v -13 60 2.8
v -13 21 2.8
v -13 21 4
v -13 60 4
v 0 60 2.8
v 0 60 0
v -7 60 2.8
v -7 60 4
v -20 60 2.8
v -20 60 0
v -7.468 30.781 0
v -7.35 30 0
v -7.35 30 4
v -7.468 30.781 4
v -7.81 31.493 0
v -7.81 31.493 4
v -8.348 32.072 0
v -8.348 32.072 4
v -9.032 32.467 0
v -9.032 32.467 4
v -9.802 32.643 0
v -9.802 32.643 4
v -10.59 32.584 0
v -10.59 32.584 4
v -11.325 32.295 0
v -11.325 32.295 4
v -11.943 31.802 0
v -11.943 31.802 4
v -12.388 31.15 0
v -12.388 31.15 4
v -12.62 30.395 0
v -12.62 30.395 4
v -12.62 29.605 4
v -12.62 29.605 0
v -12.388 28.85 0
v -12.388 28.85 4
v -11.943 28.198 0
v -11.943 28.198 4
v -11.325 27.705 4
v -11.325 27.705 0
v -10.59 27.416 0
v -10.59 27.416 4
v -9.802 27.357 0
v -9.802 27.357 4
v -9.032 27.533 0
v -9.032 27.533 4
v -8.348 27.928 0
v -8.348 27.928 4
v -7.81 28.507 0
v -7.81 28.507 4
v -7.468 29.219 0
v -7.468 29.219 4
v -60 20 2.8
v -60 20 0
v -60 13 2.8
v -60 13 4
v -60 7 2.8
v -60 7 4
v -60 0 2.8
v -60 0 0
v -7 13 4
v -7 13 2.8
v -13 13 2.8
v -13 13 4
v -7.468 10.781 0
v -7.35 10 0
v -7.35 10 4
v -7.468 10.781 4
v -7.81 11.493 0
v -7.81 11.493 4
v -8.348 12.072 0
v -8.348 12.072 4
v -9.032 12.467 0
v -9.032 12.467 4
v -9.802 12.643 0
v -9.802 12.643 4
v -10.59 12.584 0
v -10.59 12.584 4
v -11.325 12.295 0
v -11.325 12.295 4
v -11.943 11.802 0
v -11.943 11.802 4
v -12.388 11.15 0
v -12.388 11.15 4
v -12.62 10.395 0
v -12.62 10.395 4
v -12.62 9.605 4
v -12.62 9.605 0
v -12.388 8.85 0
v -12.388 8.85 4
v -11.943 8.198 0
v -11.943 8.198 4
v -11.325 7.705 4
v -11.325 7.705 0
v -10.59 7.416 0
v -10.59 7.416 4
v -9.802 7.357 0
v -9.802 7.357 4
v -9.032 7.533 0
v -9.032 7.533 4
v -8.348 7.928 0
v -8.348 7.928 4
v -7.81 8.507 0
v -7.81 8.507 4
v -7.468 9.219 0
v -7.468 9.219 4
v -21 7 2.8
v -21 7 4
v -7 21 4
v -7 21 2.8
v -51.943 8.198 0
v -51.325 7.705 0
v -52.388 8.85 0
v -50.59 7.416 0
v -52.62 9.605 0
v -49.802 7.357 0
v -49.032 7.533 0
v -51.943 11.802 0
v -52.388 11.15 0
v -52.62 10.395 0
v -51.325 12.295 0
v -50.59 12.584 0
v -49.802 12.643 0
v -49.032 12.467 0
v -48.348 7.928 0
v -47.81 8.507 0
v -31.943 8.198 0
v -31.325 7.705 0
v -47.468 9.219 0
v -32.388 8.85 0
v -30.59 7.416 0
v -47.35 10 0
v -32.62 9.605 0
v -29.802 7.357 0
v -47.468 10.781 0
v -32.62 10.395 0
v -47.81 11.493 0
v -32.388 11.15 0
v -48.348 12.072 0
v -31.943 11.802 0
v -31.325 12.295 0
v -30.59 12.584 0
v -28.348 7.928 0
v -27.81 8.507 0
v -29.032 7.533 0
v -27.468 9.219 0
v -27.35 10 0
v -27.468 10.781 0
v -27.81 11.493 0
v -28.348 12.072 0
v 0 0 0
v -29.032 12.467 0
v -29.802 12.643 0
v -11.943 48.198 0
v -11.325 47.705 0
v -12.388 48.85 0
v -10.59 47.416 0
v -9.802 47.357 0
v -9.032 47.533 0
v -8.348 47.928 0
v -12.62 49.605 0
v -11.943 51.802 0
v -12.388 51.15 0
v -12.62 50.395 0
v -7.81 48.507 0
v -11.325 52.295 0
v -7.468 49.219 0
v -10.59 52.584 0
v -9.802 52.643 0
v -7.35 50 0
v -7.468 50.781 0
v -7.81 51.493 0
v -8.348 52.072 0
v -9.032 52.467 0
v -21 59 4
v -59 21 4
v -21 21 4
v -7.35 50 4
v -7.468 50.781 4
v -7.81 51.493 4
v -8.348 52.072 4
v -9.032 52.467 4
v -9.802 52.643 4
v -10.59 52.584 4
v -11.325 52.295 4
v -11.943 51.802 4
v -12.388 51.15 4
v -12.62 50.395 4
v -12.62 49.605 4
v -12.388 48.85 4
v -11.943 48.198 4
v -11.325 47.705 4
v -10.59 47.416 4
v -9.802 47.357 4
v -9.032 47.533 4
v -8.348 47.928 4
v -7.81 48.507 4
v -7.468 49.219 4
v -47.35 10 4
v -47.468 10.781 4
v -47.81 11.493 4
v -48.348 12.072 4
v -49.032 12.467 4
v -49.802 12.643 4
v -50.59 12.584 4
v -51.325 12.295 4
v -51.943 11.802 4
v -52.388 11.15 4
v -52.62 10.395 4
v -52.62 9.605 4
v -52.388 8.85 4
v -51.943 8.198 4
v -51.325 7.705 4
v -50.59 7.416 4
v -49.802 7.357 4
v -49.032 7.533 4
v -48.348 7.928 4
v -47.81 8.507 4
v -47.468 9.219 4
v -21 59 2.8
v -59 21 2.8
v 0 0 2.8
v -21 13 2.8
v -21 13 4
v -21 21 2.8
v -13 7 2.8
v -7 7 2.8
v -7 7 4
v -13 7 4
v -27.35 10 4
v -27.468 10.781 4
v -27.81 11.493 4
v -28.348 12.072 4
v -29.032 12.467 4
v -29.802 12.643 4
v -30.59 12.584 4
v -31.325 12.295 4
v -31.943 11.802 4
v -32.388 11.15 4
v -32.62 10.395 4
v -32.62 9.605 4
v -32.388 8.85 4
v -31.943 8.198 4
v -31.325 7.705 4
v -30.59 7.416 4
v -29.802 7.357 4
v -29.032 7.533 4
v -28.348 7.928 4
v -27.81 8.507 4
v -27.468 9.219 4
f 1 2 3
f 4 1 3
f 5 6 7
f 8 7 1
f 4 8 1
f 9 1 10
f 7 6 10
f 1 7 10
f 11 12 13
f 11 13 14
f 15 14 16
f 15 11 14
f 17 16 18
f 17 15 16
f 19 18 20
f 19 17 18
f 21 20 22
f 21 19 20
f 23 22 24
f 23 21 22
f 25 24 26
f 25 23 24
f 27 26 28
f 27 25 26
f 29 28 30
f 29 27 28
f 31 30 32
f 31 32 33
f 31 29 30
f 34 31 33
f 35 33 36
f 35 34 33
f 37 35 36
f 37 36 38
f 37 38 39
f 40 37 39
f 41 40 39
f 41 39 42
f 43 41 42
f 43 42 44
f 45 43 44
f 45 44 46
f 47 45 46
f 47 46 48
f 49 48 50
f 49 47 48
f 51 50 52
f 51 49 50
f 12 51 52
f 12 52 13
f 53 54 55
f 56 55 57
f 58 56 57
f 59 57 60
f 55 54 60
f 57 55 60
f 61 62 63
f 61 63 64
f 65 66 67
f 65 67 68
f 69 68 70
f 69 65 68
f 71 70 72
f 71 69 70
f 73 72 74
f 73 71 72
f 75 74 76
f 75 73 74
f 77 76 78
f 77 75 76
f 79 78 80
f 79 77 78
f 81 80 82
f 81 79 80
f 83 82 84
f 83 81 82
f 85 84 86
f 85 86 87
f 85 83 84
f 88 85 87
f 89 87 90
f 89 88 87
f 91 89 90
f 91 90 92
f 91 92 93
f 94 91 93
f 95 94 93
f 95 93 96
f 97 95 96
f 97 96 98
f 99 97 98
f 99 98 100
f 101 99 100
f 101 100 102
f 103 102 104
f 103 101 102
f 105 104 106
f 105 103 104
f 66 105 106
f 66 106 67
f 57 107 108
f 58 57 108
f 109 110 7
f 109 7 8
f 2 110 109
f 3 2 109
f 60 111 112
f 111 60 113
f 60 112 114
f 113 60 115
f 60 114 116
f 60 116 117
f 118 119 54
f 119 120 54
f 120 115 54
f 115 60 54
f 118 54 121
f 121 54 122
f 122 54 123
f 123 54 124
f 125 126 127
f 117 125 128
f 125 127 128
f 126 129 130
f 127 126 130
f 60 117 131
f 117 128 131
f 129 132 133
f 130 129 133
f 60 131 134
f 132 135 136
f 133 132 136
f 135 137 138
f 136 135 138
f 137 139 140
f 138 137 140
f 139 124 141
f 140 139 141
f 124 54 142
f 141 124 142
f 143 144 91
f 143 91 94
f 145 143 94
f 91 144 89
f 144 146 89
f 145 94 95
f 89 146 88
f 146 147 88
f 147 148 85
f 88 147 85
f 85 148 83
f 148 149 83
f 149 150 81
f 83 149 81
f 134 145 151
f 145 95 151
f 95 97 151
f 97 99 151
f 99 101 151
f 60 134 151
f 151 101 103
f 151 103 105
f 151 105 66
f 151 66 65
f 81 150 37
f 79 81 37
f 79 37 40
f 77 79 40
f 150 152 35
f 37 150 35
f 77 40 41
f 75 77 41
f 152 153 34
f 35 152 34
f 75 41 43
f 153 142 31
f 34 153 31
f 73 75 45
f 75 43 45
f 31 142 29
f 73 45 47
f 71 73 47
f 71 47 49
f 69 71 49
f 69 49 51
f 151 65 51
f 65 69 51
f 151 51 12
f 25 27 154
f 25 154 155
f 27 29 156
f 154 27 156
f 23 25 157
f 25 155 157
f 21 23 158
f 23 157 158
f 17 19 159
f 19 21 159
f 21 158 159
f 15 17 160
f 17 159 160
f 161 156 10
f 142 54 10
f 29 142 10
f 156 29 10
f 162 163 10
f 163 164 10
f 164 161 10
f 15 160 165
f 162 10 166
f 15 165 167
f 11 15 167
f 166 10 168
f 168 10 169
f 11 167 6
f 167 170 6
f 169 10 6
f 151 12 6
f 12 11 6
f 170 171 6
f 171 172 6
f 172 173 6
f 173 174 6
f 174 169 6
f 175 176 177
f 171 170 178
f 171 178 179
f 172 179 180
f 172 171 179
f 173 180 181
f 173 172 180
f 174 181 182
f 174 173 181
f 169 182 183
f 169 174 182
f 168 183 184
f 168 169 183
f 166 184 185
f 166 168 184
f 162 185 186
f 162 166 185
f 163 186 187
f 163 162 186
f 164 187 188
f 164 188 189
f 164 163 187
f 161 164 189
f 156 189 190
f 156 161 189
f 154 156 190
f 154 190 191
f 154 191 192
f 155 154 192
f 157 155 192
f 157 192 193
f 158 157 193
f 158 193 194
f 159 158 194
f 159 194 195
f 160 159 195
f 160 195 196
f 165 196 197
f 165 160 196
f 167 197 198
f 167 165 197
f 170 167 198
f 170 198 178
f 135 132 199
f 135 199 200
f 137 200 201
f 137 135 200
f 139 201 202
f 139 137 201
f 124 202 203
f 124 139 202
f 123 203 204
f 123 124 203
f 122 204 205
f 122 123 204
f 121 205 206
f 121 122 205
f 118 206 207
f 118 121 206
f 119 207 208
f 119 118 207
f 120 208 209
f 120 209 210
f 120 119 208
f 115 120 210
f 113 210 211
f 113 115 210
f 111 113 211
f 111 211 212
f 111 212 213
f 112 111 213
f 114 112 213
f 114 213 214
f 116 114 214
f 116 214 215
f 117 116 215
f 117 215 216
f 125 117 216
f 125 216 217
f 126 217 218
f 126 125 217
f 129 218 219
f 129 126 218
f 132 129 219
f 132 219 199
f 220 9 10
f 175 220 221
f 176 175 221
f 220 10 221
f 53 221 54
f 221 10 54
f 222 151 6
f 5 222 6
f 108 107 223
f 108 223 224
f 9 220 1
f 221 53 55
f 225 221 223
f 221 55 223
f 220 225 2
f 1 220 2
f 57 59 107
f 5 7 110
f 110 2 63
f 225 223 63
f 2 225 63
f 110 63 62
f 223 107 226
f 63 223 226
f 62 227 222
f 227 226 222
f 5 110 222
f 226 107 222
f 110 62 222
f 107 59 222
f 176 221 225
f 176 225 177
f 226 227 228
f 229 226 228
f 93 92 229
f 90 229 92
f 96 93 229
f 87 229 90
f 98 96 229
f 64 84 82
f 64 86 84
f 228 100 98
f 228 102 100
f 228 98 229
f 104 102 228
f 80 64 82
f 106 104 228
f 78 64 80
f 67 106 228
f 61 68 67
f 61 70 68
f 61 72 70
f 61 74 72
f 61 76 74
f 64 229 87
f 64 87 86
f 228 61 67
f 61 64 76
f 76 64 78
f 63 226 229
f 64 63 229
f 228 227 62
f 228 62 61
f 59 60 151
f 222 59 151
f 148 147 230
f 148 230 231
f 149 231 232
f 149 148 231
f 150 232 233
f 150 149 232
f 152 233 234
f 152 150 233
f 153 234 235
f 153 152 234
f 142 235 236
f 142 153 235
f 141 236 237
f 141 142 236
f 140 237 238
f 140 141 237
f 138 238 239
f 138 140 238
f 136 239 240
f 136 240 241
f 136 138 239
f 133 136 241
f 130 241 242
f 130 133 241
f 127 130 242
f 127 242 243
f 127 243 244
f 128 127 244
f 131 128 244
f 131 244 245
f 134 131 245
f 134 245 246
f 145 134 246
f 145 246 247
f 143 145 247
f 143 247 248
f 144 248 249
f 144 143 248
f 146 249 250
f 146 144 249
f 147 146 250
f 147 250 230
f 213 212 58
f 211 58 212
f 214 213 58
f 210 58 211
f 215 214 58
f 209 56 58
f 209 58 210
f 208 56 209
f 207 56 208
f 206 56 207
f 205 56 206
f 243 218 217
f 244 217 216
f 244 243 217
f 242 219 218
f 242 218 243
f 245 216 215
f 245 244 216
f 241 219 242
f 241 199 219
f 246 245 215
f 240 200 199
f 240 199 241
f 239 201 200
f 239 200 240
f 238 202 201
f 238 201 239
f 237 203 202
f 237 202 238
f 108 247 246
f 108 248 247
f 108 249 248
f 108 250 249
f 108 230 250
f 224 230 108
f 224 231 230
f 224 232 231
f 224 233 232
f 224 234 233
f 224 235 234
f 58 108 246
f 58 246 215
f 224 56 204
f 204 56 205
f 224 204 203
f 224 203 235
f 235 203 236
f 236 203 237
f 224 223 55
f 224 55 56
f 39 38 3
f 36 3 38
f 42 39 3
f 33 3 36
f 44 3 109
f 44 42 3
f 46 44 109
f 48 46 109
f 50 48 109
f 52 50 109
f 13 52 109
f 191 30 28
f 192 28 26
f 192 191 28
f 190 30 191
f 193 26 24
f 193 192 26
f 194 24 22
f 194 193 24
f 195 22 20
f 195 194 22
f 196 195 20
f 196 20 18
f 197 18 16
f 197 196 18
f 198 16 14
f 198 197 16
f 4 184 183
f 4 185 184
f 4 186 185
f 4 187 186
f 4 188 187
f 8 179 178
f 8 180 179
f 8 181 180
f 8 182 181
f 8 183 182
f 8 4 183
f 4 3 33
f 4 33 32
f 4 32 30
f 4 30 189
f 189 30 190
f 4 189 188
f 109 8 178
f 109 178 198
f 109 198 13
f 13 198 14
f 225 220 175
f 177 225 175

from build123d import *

# Parameters (mm, degrees)
SKETCH_R        = 2.65
PAD_DEPTH       = 4
SKETCH001_W     = 7
SKETCH001_H     = 1.2
SKETCH001_W_2   = 8
POCKET_DEPTH    = 60.001
SKETCH002_W     = 7
SKETCH002_H     = 1.2
SKETCH002_W_2   = 8
POCKET001_DEPTH = 60.001


with BuildPart() as part:
    # Sketch → Pad (new body)
    with BuildSketch(Plane.XY):
        Polygon((0, 0), (0, 60), (-20, 60), (-60, 20), (-60, 0), align=None)
        with Locations((-50, 10)):
            Circle(SKETCH_R, mode=Mode.SUBTRACT)
        with Locations((-10, 10)):
            Circle(SKETCH_R, mode=Mode.SUBTRACT)
        with Locations((-30, 10)):
            Circle(SKETCH_R, mode=Mode.SUBTRACT)
        with Locations((-10, 50)):
            Circle(SKETCH_R, mode=Mode.SUBTRACT)
        with Locations((-10, 30)):
            Circle(SKETCH_R, mode=Mode.SUBTRACT)
    extrude(amount=PAD_DEPTH)

    # Sketch001 → Pocket (cut, through all)
    with BuildSketch(Plane.XZ):
        with Locations((-3.5, 3.4)):
            Rectangle(SKETCH001_W, SKETCH001_H)
        with Locations((-17, 3.4)):
            Rectangle(SKETCH001_W_2, SKETCH001_H)
    extrude(amount=-POCKET_DEPTH, mode=Mode.SUBTRACT)

    # Sketch002 → Pocket001 (cut, through all)
    with BuildSketch(Plane.YZ):
        with Locations((3.5, 3.4)):
            Rectangle(SKETCH002_W, SKETCH002_H)
        with Locations((17, 3.4)):
            Rectangle(SKETCH002_W_2, SKETCH002_H)
    extrude(amount=-POCKET001_DEPTH, mode=Mode.SUBTRACT)


solid = part.part
